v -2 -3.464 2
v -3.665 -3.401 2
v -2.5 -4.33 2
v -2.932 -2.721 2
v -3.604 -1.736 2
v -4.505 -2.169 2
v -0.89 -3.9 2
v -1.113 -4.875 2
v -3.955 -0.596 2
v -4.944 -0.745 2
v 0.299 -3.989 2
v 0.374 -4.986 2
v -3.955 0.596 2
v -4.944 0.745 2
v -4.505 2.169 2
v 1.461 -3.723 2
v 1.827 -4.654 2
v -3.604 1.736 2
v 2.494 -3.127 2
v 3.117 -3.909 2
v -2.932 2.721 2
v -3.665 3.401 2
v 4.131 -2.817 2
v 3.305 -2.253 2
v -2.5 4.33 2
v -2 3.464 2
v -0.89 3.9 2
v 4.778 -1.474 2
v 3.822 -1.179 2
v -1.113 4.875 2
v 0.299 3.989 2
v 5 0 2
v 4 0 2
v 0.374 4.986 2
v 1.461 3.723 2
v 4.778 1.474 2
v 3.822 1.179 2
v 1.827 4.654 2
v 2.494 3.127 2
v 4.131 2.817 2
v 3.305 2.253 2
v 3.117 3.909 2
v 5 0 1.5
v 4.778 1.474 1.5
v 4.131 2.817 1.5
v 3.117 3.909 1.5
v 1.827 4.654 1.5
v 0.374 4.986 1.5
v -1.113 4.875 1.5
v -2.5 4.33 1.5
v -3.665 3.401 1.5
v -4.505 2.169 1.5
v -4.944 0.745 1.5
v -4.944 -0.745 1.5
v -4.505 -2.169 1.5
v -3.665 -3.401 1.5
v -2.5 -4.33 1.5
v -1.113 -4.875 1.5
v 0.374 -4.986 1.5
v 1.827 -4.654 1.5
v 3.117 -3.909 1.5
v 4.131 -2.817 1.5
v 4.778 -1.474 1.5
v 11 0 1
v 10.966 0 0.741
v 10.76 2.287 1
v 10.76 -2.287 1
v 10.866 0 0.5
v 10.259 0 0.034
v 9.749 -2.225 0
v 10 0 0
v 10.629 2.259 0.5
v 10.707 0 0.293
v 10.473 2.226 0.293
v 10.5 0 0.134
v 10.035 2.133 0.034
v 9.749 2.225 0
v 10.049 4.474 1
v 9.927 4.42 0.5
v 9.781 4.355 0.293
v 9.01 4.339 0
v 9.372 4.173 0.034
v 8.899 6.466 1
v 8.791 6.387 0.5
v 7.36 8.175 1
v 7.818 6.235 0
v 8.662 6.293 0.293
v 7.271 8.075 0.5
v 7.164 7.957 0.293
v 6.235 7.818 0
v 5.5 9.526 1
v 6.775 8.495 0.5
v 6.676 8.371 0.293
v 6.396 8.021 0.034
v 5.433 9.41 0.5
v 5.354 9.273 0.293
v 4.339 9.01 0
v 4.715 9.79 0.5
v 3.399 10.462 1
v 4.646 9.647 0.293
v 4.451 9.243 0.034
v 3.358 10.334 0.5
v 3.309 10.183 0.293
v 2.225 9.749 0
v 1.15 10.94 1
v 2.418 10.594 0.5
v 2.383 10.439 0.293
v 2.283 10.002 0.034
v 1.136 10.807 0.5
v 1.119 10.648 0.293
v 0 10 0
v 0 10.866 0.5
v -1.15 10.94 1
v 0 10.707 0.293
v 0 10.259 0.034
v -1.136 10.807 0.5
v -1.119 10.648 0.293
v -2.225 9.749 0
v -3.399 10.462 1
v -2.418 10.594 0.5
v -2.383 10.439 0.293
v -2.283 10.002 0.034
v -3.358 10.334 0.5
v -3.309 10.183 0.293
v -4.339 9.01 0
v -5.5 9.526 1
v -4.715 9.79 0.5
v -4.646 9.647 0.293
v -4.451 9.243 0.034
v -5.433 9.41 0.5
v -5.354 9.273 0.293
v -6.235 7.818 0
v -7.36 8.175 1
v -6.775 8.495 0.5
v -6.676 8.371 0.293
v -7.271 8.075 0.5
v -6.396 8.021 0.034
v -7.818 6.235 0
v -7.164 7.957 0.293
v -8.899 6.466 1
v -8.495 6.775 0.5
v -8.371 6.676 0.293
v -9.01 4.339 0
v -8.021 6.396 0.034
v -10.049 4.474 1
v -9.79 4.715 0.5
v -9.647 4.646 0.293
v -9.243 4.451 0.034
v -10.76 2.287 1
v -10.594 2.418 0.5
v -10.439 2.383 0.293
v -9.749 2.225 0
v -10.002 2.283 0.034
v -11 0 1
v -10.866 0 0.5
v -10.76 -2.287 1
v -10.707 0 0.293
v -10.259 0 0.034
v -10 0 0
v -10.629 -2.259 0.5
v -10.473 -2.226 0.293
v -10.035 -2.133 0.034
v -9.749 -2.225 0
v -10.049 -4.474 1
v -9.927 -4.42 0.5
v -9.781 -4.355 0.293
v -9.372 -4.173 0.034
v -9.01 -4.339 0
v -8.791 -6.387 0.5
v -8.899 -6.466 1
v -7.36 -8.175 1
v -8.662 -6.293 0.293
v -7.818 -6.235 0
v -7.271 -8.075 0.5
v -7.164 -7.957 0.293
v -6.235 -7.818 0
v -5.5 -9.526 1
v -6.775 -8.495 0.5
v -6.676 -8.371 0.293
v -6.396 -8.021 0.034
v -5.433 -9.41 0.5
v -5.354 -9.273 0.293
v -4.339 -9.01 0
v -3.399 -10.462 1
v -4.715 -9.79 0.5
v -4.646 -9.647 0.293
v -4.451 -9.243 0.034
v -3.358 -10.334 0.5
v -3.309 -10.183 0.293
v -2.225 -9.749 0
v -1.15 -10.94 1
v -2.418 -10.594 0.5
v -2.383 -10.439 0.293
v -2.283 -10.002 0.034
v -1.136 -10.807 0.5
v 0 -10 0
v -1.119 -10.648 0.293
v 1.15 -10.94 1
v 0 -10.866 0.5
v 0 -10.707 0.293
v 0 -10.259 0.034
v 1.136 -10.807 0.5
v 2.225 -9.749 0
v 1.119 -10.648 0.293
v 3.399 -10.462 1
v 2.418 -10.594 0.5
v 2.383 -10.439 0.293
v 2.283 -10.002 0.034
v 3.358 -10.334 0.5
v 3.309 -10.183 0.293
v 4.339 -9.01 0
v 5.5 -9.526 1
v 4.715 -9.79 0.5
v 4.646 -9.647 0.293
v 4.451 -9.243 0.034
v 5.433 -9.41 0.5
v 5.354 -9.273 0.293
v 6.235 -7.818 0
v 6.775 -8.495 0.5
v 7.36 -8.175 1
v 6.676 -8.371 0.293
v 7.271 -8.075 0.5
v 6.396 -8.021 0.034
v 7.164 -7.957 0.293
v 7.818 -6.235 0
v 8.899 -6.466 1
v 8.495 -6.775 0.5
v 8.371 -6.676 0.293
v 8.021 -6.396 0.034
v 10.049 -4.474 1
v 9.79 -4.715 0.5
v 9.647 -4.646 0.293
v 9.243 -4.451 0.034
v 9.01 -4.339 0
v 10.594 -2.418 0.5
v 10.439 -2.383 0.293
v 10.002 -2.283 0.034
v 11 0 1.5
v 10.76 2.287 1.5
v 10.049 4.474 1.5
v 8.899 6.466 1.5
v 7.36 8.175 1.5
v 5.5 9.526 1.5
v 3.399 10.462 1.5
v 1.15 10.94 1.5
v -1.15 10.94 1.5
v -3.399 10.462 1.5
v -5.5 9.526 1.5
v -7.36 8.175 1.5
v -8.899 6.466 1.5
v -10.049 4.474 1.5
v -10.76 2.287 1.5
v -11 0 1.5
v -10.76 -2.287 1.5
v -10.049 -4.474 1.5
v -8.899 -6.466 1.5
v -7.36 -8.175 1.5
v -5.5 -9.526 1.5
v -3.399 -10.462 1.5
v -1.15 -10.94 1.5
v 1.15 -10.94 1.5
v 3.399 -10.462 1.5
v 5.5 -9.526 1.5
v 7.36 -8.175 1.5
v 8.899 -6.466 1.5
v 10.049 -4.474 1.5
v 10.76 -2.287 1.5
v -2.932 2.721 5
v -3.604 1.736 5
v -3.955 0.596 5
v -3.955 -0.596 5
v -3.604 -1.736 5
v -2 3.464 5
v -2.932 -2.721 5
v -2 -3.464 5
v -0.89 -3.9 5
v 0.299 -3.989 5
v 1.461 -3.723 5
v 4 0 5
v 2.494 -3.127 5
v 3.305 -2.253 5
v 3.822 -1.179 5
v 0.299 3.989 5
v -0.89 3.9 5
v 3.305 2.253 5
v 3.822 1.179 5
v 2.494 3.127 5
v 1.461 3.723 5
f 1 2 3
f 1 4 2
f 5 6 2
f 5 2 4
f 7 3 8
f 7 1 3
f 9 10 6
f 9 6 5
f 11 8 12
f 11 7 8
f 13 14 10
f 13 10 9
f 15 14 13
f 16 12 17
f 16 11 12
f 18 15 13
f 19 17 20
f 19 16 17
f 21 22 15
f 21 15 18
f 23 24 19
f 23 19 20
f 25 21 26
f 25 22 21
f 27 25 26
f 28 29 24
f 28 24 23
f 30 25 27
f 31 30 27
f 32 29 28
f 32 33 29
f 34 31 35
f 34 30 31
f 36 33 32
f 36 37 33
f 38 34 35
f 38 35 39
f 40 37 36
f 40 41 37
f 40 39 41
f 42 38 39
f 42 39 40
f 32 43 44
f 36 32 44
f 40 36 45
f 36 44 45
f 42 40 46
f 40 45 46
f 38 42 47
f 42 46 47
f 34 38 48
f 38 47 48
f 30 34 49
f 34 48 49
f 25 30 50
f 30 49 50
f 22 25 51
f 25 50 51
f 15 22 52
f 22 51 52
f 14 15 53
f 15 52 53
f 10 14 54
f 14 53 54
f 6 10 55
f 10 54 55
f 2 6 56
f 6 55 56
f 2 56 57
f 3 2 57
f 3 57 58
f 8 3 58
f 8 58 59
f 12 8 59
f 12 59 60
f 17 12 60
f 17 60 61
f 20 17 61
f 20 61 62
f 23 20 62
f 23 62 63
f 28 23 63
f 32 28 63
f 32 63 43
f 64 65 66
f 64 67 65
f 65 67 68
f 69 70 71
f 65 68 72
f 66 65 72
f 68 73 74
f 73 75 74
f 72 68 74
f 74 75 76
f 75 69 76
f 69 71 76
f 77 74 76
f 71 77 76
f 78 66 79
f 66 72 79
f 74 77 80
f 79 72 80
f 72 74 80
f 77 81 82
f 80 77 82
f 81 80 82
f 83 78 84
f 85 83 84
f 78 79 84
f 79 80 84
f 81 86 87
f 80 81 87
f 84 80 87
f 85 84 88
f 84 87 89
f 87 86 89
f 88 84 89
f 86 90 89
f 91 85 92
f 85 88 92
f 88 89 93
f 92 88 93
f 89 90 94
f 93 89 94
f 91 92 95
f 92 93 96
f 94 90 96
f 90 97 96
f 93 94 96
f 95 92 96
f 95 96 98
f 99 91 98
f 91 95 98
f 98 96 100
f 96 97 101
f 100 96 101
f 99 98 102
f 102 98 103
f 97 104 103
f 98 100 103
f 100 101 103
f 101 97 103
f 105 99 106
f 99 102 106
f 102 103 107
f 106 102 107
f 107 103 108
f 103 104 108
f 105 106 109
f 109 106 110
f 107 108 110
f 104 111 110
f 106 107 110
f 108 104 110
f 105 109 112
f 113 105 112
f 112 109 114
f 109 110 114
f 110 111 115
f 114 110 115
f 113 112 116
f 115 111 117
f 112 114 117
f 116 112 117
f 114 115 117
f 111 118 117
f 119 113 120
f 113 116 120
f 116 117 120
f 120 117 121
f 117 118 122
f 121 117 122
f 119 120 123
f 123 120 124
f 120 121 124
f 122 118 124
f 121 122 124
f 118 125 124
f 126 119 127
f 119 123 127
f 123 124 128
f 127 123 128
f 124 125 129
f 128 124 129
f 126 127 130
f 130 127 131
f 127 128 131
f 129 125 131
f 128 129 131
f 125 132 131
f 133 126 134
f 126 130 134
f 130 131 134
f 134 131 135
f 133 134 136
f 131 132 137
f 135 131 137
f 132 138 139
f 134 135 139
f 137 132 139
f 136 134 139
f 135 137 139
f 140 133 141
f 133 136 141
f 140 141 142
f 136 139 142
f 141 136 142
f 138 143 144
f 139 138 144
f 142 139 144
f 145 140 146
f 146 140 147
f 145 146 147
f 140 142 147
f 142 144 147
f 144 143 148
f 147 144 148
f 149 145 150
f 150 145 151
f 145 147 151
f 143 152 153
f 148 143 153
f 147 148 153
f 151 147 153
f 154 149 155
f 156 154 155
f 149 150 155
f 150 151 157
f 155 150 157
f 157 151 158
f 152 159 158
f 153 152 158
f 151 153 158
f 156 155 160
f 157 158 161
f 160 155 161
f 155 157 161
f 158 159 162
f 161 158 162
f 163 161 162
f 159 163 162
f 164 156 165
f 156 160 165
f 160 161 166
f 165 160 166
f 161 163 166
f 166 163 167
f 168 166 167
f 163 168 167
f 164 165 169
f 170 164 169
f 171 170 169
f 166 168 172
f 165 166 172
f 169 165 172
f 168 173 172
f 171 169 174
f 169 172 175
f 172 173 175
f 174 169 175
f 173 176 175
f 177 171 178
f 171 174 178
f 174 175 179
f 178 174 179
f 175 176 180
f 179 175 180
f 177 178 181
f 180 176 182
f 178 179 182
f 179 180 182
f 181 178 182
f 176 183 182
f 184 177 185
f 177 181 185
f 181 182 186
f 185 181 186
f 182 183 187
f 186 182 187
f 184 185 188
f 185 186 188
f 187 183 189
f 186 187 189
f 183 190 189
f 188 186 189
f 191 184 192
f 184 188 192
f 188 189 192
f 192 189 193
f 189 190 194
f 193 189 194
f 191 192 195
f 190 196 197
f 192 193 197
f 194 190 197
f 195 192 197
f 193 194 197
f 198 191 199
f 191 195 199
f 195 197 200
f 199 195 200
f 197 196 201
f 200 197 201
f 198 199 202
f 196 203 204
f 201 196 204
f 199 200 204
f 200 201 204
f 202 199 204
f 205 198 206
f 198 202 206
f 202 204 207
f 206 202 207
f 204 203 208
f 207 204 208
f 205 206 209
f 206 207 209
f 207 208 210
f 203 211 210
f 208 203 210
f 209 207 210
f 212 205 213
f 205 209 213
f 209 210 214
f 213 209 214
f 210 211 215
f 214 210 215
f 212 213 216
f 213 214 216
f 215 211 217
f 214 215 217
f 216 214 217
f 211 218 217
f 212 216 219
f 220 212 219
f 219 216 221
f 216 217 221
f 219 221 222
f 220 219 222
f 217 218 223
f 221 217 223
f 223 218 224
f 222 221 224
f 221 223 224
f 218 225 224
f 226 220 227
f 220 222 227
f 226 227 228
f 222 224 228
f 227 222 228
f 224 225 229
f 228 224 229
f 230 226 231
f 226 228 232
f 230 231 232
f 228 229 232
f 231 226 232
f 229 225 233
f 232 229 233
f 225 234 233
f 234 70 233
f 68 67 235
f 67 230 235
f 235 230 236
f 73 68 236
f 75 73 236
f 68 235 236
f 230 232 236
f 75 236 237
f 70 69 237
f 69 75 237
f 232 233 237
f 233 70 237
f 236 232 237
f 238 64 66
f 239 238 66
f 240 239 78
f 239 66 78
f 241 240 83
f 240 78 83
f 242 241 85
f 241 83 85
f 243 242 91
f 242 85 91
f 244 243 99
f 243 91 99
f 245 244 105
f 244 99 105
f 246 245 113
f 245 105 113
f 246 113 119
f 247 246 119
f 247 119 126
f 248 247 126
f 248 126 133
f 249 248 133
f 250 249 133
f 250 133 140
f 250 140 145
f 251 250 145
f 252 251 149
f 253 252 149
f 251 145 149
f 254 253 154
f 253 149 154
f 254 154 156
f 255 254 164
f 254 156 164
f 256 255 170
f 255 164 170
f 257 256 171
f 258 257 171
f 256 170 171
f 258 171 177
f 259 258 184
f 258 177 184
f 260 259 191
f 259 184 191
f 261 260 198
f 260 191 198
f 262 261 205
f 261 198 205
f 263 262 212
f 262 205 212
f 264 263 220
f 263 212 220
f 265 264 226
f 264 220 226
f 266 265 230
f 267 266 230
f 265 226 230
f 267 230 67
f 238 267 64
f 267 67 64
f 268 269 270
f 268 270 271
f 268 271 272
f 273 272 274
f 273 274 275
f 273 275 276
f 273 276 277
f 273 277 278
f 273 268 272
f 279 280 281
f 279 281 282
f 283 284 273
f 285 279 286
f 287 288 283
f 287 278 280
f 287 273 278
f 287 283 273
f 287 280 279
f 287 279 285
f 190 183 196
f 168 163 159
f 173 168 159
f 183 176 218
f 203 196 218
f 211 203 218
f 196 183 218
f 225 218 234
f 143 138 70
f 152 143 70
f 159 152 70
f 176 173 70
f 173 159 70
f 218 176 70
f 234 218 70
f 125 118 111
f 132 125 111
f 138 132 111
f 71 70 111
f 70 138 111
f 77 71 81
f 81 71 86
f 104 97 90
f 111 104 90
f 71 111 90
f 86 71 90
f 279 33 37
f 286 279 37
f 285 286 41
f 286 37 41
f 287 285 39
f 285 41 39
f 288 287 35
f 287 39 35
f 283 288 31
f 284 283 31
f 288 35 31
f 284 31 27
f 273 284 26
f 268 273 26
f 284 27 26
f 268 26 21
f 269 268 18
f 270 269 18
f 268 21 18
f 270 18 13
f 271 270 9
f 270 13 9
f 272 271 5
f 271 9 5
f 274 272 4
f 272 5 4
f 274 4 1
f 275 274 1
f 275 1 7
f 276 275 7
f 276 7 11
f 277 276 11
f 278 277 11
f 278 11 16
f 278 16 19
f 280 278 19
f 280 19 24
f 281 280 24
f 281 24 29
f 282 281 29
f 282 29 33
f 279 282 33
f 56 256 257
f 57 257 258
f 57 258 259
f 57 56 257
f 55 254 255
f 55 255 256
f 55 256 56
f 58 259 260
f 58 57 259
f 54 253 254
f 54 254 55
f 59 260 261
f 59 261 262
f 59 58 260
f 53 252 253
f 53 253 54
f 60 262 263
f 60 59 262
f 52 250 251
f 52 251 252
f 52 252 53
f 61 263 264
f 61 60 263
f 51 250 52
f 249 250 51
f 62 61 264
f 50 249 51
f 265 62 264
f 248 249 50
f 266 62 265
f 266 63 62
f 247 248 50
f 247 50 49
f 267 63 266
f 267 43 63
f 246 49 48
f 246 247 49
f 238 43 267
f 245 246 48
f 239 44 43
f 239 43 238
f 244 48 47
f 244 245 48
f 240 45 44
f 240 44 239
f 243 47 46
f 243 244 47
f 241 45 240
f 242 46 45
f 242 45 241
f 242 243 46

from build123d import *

# Parameters (mm, degrees)
F0_R     = 11
F0_R_2   = 5
F1_DEPTH = 1.5
F0_R_3   = 4
F2_DEPTH = 2
F3_DEPTH = 5
F4_R     = 1


with BuildPart() as f1:
    # F0 (on Top) → F1 (new body)
    with BuildSketch(Plane.XY):
        Circle(F0_R)
        Circle(F0_R_2, mode=Mode.SUBTRACT)
    extrude(amount=F1_DEPTH)

    # F0 (on Top) → F2 (join)
    with BuildSketch(Plane.XY):
        Circle(F0_R_2)
        Circle(F0_R_3, mode=Mode.SUBTRACT)
    extrude(amount=F2_DEPTH)

    # F0 (on Top) → F3 (join)
    with BuildSketch(Plane.XY):
        Circle(F0_R_3)
    extrude(amount=F3_DEPTH)

    # F4
    f4_edges = [f1.edges().sort_by_distance(p)[0] for p in [
        (-11, 0, 0),
    ]]
    fillet(f4_edges, radius=F4_R)


solid = f1.part
